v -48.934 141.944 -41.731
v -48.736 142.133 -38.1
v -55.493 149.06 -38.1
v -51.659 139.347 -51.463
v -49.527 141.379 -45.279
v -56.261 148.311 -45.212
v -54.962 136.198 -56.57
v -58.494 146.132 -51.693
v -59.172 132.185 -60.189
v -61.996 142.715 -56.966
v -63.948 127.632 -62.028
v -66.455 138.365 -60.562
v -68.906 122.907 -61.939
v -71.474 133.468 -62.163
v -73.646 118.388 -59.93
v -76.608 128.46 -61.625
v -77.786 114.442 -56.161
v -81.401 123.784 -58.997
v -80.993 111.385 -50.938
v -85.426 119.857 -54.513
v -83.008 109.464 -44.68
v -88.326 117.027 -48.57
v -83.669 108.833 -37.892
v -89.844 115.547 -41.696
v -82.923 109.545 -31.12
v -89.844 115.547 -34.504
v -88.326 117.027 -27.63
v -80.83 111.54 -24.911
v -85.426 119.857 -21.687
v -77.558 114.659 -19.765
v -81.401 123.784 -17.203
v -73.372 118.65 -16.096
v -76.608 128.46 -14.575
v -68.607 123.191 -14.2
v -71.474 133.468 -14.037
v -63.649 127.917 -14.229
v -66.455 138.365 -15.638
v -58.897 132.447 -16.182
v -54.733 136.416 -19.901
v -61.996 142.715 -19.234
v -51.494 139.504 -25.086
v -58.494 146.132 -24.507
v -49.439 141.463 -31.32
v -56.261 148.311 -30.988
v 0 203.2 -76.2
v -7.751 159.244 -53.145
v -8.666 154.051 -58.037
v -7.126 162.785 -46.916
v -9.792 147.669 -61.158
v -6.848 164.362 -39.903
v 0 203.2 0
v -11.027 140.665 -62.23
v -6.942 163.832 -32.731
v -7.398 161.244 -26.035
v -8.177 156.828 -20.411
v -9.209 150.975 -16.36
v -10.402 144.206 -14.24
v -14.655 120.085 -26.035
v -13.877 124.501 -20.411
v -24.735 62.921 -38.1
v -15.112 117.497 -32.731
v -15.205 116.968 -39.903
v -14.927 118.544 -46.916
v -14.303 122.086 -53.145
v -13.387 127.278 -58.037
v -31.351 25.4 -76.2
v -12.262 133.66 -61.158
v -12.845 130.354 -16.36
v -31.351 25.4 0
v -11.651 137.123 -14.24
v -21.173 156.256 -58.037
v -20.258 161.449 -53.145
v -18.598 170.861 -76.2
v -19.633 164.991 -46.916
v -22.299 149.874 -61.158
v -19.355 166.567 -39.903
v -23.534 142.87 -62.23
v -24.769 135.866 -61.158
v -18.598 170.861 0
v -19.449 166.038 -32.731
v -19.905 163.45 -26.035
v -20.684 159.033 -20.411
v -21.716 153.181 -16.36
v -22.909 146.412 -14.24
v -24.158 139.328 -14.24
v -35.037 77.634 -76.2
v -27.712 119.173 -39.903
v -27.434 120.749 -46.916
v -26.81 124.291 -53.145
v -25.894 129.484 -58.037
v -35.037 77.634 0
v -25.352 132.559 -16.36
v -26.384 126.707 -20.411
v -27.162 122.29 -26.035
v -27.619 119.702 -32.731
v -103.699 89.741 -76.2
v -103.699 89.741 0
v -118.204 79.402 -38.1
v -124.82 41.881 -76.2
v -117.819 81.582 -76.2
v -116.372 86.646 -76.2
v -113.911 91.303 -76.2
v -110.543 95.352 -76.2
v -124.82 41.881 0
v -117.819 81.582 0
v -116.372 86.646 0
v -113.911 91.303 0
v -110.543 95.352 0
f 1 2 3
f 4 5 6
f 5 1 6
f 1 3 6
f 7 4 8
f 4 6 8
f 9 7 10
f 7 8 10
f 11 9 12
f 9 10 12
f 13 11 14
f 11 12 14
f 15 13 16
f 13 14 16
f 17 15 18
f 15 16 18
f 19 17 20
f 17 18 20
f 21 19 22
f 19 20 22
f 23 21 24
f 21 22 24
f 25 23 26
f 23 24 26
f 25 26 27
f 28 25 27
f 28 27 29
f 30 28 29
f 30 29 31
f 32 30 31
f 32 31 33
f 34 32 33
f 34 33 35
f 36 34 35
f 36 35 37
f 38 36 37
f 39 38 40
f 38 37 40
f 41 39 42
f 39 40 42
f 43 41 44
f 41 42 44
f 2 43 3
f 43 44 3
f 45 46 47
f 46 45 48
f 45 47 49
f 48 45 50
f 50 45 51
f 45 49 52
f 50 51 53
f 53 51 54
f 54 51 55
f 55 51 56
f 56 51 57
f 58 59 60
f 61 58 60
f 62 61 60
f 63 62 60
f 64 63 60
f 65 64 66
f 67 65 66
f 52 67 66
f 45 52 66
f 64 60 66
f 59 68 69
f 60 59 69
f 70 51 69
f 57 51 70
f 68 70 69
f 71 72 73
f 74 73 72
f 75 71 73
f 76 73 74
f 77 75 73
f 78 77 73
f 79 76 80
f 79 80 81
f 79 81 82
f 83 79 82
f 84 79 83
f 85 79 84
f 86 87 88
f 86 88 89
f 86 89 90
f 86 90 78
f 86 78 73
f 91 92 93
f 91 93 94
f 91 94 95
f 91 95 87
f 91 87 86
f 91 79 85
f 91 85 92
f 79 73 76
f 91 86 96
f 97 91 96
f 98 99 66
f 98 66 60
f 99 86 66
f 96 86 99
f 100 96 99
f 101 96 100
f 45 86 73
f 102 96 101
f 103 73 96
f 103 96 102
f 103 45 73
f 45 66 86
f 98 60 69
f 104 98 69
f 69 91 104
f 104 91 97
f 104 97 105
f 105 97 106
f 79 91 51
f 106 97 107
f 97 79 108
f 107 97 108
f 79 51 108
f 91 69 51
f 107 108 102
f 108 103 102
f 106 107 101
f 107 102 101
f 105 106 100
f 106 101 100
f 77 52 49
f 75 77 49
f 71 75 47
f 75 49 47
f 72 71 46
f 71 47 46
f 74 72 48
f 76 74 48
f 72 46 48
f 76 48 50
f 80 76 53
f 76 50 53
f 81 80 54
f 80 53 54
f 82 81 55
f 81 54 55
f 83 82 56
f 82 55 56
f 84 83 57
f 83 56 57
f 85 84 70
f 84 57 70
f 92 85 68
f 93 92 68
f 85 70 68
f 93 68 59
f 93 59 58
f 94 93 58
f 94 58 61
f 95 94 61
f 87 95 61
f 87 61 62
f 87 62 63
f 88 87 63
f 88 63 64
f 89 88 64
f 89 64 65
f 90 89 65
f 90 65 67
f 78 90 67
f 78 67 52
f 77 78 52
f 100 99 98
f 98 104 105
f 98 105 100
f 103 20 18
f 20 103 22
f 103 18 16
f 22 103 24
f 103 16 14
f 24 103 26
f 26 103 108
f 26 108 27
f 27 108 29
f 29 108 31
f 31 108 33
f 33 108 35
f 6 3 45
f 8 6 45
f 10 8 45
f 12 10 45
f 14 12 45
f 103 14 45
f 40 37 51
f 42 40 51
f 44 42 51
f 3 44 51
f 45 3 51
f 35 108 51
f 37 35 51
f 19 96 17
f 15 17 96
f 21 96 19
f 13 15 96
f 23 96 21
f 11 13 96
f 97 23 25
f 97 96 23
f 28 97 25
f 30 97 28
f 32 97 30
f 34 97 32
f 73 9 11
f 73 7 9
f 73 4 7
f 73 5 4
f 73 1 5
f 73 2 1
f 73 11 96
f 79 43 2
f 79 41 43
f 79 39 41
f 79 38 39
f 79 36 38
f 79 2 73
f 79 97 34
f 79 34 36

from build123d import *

# Parameters (mm, degrees)
BOSS_EXTRUDE1_DEPTH   = 76.2
CUT_EXTRUDE3_DEPTH    = 77.2
CUT_EXTRUDE4_DEPTH    = 77.2
CUT_EXTRUDE5_DEPTH    = 126.785464248
SLANTED_CIRCLE_REACH  = 129.265
SKETCH10_R            = 24.13
BACK_CIRCLE_CUT_REACH = 124.924
SKETCH11_R            = 24.13
FILLET2_R             = 25.4


with BuildPart() as part:
    # Sketch2 → Boss-Extrude1 (new body)
    with BuildSketch(Plane.XY):
        Polygon((0, 203.2), (-31.35093717, 25.4), (-159.146418514, 47.933791374), align=None)
    extrude(amount=-BOSS_EXTRUDE1_DEPTH)

    # Sketch6 → Cut-Extrude3 (cut, through all)
    with BuildSketch(Plane.XY):
        Polygon((-18.598164113, 170.860955123), (-35.036668208, 77.633565709), (-103.699217462, 89.740625707), align=None)
    extrude(amount=-CUT_EXTRUDE3_DEPTH, mode=Mode.SUBTRACT)

    # Sketch8 → Cut-Extrude4 (cut, through all)
    with BuildSketch(Plane.XY):
        Polygon((-124.819846836, 41.881090632), (-116.398812065, 89.639152029), (-159.146418514, 47.933791374), align=None)
    extrude(amount=-CUT_EXTRUDE4_DEPTH, mode=Mode.SUBTRACT)

    # Sketch9 → Cut-Extrude5 (cut, through all)
    with BuildSketch(Plane(origin=(-128.218156228, 22.60832036, 0), x_dir=(0, 0, 1), z_dir=(-0.984807753, 0.173648178, 0))):
        Polygon((-76.2, 19.570083819), (-38.1, 57.670083819), (0, 19.570083819), align=None)
    extrude(amount=-CUT_EXTRUDE5_DEPTH, mode=Mode.SUBTRACT)

    # Sketch10 → Slanted Circle (cut, up to next)
    with BuildSketch(Plane(origin=(-101.569056599, 104.107337538, 0), x_dir=(0.715778778, 0.698327101, 0), z_dir=(-0.698327101, 0.715778778, 0)), mode=Mode.PRIVATE) as slanted_circle_sk1:
        with Locations((40.241649701, 38.1)):
            Circle(SKETCH10_R)
    slanted_circle_tool1 = extrude(slanted_circle_sk1.sketch, amount=-SLANTED_CIRCLE_REACH, mode=Mode.PRIVATE) & part.part
    add(slanted_circle_tool1.solids().sort_by_distance((-72.764938, 132.209172, -38.1))[0], mode=Mode.SUBTRACT)

    # Sketch11 → Back Circle Cut (cut, up to next)
    with BuildSketch(Plane(origin=(-34.749246562, 6.127229728, 0), x_dir=(0, 0, -1), z_dir=(0.984807753, -0.173648178, 0)), mode=Mode.PRIVATE) as back_circle_cut_sk1:
        with Locations((38.1, 136.612935412)):
            Circle(SKETCH11_R)
    back_circle_cut_tool1 = extrude(back_circle_cut_sk1.sketch, amount=-BACK_CIRCLE_CUT_REACH, mode=Mode.PRIVATE) & part.part
    add(back_circle_cut_tool1.solids().sort_by_distance((-11.026659, 140.664708, -38.1))[0], mode=Mode.SUBTRACT)

    # Fillet2
    fillet2_edges = [part.edges().sort_by_distance(p)[0] for p in [
        (-116.398812065, 89.639152029, -38.1),
    ]]
    fillet(fillet2_edges, radius=FILLET2_R)


solid = part.part
